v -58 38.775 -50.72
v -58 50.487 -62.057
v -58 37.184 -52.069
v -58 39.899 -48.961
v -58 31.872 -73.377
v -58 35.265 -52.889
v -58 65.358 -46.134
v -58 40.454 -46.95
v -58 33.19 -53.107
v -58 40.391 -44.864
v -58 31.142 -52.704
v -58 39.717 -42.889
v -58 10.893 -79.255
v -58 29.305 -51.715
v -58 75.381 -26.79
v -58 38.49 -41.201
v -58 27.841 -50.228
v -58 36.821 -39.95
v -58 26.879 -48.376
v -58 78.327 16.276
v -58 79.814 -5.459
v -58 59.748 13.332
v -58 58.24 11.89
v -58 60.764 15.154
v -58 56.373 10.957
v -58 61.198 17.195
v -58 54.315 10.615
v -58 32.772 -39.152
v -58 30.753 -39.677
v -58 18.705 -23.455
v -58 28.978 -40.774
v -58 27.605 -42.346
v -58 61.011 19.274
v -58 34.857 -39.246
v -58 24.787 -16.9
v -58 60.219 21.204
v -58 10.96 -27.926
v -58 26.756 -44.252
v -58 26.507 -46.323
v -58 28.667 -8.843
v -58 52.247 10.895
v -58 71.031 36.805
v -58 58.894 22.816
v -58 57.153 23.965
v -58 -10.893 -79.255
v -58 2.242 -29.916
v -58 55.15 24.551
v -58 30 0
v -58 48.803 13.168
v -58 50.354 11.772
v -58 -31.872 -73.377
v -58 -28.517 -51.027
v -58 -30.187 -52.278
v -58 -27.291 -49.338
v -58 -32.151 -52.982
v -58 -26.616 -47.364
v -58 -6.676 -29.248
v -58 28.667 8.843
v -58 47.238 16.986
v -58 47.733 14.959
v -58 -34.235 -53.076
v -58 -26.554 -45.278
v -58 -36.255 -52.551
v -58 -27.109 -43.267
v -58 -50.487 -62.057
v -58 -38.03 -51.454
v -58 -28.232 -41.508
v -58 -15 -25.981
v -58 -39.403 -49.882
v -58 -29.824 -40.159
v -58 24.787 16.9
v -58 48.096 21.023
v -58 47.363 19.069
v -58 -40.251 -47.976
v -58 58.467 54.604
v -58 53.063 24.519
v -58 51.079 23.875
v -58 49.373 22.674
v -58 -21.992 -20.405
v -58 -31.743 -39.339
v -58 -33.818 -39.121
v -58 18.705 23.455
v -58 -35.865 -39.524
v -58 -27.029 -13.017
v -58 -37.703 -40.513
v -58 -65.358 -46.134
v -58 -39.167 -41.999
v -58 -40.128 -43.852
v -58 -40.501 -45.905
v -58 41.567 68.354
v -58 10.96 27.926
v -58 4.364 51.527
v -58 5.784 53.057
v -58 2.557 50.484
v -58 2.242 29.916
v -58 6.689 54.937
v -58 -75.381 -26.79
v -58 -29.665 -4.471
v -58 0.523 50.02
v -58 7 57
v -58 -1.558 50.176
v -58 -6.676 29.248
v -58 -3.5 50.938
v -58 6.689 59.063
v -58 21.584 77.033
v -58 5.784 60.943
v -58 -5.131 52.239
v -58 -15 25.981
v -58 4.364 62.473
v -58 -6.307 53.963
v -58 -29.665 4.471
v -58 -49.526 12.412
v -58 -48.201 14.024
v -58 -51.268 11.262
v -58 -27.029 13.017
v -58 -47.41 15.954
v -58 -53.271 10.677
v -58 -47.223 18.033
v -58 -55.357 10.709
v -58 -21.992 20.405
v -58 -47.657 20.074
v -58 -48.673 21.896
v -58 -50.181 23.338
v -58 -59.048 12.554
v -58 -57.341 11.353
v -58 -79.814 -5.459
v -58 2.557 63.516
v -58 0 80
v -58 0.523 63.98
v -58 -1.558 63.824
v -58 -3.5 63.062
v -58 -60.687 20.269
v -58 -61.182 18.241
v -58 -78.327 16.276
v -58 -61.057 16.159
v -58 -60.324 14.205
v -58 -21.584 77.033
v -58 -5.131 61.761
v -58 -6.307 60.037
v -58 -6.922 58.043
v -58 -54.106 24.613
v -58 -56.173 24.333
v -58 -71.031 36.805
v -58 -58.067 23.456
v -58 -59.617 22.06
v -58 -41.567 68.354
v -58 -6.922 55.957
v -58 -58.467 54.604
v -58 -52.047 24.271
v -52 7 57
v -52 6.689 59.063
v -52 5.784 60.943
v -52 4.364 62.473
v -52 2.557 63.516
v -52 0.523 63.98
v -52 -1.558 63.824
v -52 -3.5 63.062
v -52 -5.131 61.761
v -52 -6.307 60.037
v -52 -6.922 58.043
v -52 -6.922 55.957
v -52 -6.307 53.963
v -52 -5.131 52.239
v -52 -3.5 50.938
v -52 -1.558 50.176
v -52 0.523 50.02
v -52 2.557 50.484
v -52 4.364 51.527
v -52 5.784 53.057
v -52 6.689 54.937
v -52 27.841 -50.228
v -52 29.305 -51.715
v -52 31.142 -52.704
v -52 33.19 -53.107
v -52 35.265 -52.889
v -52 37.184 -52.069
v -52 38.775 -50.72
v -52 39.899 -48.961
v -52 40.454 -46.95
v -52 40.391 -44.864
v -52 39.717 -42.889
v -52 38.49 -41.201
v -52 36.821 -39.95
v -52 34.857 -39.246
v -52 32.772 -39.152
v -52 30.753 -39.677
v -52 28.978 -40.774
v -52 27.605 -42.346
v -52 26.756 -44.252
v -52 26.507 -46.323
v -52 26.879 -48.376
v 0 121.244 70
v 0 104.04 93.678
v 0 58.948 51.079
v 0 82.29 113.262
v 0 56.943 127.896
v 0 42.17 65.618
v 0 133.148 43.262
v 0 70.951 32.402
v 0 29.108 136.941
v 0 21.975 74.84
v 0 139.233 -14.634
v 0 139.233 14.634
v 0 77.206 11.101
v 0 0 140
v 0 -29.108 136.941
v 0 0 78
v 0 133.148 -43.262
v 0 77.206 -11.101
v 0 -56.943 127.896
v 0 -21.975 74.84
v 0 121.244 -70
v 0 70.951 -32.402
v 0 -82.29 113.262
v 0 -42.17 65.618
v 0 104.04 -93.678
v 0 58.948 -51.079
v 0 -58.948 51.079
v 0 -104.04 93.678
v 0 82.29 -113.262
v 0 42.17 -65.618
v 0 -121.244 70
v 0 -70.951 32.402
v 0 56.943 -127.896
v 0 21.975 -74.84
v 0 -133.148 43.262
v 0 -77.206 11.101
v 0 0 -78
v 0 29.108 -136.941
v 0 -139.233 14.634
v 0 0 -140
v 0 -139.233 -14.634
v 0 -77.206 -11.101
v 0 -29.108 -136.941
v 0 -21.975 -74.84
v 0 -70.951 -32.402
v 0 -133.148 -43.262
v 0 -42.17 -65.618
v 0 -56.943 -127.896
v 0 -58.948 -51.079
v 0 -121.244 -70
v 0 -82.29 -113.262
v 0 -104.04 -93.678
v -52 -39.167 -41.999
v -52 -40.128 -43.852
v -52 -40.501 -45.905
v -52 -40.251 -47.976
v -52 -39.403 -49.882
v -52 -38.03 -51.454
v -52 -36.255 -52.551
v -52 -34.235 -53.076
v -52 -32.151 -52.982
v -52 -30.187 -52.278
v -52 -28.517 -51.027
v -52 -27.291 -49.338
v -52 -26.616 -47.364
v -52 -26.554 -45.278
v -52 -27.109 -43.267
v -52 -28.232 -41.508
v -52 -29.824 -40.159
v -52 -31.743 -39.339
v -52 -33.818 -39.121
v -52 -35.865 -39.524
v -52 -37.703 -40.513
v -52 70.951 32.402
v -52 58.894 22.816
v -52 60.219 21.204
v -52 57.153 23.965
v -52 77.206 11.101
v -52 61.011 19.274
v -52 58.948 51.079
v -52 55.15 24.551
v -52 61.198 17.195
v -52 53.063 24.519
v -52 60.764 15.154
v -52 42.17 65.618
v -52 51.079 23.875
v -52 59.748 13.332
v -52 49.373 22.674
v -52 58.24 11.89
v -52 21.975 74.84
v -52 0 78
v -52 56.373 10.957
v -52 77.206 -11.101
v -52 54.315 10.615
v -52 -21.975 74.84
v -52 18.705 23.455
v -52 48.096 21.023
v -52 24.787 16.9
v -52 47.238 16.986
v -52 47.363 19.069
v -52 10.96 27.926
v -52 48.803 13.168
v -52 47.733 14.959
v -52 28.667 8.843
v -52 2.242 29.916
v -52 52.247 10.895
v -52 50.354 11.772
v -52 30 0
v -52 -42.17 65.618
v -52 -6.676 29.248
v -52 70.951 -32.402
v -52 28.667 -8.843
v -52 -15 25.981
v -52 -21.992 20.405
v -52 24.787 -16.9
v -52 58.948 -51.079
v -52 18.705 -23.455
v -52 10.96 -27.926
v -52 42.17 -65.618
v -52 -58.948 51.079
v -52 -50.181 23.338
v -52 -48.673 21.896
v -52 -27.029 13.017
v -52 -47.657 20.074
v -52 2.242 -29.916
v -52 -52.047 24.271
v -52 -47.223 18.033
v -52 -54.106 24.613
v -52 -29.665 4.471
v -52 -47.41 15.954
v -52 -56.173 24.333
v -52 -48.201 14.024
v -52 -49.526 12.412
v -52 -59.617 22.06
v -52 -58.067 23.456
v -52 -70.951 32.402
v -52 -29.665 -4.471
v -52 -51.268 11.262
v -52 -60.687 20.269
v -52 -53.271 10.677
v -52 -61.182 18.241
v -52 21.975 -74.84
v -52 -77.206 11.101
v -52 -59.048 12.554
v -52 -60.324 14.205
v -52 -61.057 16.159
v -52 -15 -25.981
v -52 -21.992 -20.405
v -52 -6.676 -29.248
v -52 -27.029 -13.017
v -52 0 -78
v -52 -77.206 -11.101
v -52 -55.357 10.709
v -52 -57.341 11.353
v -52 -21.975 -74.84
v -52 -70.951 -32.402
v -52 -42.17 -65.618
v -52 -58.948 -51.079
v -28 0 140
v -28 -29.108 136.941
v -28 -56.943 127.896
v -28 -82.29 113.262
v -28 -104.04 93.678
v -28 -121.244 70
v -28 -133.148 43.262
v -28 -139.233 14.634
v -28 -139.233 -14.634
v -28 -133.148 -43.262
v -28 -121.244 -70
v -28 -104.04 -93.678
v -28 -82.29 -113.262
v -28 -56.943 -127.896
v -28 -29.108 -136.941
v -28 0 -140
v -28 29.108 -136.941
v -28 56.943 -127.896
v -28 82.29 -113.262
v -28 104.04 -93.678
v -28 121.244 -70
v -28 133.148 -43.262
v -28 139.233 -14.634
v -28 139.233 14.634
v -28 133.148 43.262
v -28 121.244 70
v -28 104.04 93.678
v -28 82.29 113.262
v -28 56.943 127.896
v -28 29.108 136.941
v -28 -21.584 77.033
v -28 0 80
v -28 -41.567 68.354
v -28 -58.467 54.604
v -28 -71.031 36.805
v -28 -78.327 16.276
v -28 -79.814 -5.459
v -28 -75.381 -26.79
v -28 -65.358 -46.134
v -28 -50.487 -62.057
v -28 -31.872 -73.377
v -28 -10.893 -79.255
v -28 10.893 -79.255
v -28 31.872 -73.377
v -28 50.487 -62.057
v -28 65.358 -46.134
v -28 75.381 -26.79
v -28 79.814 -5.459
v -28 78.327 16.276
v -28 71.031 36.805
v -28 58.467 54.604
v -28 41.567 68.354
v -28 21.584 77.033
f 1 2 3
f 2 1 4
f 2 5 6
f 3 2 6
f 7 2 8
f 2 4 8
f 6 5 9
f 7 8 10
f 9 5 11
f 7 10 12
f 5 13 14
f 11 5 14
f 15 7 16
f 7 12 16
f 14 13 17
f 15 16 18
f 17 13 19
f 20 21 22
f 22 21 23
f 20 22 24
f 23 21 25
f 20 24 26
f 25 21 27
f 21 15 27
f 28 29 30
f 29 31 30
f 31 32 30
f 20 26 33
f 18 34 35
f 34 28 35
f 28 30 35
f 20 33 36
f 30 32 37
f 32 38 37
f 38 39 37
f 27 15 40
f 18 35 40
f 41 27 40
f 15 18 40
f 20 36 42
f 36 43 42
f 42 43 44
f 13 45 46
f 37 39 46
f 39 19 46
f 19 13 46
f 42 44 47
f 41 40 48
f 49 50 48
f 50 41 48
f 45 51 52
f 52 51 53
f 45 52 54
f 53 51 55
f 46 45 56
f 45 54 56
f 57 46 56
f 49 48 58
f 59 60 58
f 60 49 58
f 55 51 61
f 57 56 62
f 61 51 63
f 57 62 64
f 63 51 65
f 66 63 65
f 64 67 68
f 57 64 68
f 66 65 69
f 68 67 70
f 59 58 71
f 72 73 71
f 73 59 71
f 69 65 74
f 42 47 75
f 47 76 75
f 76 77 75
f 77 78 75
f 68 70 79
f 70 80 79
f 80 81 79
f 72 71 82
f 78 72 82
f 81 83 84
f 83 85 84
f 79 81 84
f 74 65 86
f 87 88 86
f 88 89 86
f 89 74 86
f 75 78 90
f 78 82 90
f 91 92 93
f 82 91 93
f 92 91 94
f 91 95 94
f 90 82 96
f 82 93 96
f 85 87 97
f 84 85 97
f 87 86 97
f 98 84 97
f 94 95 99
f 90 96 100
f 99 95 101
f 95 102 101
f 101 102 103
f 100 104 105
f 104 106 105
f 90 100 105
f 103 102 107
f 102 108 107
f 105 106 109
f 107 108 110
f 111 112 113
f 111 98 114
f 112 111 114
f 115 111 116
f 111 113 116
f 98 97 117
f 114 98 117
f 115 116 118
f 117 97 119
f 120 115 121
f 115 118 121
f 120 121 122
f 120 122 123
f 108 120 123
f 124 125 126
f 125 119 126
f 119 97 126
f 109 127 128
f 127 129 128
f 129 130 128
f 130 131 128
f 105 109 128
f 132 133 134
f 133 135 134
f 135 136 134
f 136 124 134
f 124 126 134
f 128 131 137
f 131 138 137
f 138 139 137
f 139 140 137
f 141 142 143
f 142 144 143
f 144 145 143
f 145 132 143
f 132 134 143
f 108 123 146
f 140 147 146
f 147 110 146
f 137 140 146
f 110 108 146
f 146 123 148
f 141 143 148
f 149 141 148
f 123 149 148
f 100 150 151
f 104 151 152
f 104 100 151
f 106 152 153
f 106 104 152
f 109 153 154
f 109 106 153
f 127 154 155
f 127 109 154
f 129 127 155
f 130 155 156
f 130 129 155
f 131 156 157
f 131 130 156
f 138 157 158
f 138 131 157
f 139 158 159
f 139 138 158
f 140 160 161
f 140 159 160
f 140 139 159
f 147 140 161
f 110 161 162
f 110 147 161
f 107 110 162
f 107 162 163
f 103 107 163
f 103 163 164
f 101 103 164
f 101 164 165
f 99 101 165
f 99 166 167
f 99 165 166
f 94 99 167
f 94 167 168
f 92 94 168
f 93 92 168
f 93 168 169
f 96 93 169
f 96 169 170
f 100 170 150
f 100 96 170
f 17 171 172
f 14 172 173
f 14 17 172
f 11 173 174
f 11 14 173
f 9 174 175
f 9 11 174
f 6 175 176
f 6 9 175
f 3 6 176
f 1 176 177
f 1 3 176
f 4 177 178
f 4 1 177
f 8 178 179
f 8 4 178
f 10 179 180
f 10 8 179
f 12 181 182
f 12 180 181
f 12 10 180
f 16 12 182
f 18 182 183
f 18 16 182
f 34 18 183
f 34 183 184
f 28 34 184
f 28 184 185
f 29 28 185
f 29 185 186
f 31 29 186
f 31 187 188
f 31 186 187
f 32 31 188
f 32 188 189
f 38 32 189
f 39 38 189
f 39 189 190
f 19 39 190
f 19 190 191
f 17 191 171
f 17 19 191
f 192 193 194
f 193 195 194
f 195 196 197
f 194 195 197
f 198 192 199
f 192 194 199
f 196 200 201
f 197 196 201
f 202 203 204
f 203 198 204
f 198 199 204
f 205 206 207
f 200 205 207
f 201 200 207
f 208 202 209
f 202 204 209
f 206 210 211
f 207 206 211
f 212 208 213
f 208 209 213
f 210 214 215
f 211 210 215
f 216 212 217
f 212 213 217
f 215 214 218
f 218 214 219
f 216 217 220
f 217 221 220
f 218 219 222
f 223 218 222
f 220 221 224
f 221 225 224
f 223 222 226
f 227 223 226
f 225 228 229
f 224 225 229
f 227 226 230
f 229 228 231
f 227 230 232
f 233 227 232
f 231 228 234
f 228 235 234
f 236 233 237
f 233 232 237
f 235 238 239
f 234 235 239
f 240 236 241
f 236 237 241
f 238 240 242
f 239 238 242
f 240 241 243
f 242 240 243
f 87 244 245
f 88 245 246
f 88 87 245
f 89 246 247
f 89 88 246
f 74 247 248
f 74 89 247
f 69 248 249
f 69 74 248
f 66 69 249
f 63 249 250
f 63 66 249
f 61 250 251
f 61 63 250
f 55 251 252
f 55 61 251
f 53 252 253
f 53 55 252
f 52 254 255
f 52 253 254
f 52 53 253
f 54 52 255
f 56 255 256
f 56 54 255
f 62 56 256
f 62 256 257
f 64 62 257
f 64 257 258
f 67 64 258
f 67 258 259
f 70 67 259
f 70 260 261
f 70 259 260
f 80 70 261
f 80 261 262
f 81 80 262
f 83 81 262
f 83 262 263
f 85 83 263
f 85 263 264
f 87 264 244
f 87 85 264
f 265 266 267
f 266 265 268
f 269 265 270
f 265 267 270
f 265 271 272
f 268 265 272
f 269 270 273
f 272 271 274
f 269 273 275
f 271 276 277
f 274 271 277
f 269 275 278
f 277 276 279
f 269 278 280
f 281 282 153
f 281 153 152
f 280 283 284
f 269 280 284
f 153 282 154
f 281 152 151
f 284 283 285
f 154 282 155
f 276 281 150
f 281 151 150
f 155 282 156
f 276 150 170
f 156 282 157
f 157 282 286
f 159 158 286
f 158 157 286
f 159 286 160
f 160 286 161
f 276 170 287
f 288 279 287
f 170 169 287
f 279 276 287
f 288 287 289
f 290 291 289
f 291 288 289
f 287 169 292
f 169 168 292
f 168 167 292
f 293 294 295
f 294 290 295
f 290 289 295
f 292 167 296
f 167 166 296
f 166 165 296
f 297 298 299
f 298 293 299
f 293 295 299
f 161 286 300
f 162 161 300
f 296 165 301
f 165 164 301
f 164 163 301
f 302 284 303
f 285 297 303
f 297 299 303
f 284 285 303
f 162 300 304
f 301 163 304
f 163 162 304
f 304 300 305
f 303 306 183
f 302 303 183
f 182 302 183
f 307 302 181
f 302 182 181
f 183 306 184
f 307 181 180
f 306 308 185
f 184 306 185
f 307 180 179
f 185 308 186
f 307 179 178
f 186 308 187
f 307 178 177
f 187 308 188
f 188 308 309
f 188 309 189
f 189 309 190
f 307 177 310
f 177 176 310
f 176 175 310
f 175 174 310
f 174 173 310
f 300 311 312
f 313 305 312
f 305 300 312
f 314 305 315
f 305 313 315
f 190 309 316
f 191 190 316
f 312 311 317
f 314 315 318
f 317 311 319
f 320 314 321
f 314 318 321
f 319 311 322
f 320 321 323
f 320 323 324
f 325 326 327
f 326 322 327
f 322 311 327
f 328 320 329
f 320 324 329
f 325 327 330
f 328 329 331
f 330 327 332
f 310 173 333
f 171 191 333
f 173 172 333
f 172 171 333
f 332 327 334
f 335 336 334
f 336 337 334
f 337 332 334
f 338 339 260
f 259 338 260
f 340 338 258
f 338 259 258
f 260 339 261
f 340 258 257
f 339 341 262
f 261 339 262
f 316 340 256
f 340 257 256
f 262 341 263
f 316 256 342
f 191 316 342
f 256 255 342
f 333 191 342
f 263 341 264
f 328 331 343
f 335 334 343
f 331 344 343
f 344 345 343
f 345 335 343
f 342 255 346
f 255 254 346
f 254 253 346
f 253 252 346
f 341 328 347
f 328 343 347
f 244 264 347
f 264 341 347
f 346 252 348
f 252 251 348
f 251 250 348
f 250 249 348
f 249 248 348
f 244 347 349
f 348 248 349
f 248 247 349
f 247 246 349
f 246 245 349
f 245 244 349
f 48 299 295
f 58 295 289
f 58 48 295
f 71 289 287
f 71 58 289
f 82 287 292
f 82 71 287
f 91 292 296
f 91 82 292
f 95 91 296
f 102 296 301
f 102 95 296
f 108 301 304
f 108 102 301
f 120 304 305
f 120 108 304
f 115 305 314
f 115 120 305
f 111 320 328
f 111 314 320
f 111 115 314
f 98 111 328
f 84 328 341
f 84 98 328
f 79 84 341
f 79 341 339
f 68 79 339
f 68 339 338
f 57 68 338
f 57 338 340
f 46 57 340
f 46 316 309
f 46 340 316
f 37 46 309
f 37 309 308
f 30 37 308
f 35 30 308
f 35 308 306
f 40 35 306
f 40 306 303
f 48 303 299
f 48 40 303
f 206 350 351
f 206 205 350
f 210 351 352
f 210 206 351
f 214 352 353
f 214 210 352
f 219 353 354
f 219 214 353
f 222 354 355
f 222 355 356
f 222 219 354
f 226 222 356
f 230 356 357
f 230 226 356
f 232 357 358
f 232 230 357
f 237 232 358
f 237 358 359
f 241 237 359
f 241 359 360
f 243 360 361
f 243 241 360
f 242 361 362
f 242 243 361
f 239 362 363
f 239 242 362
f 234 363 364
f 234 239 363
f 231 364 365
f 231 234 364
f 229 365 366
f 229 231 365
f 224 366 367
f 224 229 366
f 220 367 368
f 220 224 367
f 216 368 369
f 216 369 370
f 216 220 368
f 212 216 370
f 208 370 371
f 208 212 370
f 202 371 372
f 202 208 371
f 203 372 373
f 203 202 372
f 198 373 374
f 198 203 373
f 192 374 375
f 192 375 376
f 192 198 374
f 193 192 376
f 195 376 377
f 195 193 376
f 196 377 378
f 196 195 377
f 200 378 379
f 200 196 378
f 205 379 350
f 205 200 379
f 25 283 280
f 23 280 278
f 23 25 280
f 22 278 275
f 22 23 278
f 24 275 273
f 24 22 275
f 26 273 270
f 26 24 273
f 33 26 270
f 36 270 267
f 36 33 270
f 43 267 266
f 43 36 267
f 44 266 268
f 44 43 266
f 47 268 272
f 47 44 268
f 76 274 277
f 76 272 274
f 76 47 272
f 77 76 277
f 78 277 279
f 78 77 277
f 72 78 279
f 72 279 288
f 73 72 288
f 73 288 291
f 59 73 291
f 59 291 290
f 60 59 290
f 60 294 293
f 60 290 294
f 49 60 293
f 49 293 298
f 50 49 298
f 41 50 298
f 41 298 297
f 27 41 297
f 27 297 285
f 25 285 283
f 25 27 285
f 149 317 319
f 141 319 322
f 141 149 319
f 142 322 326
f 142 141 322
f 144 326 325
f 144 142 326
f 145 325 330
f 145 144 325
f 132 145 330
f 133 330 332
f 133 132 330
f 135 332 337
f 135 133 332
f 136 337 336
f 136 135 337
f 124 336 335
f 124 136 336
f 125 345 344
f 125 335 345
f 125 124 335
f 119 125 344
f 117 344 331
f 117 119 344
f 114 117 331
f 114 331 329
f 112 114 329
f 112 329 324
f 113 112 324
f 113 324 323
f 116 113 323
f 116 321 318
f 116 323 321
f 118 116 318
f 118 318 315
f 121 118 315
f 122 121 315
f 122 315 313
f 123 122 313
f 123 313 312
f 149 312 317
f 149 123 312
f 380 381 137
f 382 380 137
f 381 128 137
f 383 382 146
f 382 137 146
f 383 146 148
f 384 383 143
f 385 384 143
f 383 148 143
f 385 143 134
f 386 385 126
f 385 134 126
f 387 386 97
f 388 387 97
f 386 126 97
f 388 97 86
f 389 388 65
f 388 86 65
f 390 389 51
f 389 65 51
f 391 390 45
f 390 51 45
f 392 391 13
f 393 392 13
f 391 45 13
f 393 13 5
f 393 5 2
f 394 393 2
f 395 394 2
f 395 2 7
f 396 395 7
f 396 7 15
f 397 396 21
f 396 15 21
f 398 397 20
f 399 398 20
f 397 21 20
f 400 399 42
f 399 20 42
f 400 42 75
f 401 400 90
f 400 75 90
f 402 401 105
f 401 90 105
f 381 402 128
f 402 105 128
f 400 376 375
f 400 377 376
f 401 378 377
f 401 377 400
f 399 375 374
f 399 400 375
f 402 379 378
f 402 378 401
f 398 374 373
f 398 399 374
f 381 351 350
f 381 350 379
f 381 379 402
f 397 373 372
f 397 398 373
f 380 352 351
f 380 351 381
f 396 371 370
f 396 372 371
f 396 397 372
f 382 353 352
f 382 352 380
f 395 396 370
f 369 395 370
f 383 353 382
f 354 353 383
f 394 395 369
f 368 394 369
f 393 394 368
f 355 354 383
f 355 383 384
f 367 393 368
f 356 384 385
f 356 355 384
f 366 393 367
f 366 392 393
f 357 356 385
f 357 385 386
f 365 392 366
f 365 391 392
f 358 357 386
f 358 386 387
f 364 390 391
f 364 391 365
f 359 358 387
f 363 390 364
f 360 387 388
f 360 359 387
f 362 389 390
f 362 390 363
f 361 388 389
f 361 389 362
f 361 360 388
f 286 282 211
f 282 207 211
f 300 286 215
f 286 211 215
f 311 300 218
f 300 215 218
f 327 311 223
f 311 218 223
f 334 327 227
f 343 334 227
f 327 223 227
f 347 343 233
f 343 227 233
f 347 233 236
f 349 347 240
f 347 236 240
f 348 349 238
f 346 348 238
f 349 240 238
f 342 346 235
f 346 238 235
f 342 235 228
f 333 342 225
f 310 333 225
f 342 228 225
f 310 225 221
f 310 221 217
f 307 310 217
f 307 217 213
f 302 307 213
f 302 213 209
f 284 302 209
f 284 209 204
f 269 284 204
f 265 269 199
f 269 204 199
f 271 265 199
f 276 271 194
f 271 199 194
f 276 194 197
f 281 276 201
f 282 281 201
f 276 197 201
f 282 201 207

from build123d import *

# Parameters (mm, degrees)
F0_W     = 28
F0_H     = 60
F3_R     = 30
F3_R_2   = 7
F4_DEPTH = 7
F5_COUNT = 5


with BuildPart() as f1:
    # F0 (on Front) → F1 (revolve)
    with BuildSketch(Plane.XZ):
        Polygon((-52, 78), (0, 78), (0, 80), (-28, 80), (-52, 80), align=None)
        with Locations((-14, 110)):
            Rectangle(F0_W, F0_H)
        Polygon((-52, 0), (-52, 78), (-52, 80), (-58, 80), (-58, 0), align=None)
    revolve(axis=Axis((-29, 0, 0), (1, 0, 0)))

    # F3 (on offset) → F4 (cut)
    with BuildSketch(Plane.YZ.offset(-58)):
        Circle(F3_R)
        with Locations((0, 57)):
            Circle(F3_R_2)
    f4 = extrude(amount=F4_DEPTH, mode=Mode.SUBTRACT)

    # F5: F4 ×5 about axis
    f5_axis = Axis((-58, 0, 0), (1, 0, 0))
    for i in range(1, F5_COUNT):
        add(f4.solids().sort_by_distance((-54.5, -7, 57))[0].rotate(f5_axis, i * 360 / F5_COUNT), mode=Mode.SUBTRACT)


solid = f1.part
